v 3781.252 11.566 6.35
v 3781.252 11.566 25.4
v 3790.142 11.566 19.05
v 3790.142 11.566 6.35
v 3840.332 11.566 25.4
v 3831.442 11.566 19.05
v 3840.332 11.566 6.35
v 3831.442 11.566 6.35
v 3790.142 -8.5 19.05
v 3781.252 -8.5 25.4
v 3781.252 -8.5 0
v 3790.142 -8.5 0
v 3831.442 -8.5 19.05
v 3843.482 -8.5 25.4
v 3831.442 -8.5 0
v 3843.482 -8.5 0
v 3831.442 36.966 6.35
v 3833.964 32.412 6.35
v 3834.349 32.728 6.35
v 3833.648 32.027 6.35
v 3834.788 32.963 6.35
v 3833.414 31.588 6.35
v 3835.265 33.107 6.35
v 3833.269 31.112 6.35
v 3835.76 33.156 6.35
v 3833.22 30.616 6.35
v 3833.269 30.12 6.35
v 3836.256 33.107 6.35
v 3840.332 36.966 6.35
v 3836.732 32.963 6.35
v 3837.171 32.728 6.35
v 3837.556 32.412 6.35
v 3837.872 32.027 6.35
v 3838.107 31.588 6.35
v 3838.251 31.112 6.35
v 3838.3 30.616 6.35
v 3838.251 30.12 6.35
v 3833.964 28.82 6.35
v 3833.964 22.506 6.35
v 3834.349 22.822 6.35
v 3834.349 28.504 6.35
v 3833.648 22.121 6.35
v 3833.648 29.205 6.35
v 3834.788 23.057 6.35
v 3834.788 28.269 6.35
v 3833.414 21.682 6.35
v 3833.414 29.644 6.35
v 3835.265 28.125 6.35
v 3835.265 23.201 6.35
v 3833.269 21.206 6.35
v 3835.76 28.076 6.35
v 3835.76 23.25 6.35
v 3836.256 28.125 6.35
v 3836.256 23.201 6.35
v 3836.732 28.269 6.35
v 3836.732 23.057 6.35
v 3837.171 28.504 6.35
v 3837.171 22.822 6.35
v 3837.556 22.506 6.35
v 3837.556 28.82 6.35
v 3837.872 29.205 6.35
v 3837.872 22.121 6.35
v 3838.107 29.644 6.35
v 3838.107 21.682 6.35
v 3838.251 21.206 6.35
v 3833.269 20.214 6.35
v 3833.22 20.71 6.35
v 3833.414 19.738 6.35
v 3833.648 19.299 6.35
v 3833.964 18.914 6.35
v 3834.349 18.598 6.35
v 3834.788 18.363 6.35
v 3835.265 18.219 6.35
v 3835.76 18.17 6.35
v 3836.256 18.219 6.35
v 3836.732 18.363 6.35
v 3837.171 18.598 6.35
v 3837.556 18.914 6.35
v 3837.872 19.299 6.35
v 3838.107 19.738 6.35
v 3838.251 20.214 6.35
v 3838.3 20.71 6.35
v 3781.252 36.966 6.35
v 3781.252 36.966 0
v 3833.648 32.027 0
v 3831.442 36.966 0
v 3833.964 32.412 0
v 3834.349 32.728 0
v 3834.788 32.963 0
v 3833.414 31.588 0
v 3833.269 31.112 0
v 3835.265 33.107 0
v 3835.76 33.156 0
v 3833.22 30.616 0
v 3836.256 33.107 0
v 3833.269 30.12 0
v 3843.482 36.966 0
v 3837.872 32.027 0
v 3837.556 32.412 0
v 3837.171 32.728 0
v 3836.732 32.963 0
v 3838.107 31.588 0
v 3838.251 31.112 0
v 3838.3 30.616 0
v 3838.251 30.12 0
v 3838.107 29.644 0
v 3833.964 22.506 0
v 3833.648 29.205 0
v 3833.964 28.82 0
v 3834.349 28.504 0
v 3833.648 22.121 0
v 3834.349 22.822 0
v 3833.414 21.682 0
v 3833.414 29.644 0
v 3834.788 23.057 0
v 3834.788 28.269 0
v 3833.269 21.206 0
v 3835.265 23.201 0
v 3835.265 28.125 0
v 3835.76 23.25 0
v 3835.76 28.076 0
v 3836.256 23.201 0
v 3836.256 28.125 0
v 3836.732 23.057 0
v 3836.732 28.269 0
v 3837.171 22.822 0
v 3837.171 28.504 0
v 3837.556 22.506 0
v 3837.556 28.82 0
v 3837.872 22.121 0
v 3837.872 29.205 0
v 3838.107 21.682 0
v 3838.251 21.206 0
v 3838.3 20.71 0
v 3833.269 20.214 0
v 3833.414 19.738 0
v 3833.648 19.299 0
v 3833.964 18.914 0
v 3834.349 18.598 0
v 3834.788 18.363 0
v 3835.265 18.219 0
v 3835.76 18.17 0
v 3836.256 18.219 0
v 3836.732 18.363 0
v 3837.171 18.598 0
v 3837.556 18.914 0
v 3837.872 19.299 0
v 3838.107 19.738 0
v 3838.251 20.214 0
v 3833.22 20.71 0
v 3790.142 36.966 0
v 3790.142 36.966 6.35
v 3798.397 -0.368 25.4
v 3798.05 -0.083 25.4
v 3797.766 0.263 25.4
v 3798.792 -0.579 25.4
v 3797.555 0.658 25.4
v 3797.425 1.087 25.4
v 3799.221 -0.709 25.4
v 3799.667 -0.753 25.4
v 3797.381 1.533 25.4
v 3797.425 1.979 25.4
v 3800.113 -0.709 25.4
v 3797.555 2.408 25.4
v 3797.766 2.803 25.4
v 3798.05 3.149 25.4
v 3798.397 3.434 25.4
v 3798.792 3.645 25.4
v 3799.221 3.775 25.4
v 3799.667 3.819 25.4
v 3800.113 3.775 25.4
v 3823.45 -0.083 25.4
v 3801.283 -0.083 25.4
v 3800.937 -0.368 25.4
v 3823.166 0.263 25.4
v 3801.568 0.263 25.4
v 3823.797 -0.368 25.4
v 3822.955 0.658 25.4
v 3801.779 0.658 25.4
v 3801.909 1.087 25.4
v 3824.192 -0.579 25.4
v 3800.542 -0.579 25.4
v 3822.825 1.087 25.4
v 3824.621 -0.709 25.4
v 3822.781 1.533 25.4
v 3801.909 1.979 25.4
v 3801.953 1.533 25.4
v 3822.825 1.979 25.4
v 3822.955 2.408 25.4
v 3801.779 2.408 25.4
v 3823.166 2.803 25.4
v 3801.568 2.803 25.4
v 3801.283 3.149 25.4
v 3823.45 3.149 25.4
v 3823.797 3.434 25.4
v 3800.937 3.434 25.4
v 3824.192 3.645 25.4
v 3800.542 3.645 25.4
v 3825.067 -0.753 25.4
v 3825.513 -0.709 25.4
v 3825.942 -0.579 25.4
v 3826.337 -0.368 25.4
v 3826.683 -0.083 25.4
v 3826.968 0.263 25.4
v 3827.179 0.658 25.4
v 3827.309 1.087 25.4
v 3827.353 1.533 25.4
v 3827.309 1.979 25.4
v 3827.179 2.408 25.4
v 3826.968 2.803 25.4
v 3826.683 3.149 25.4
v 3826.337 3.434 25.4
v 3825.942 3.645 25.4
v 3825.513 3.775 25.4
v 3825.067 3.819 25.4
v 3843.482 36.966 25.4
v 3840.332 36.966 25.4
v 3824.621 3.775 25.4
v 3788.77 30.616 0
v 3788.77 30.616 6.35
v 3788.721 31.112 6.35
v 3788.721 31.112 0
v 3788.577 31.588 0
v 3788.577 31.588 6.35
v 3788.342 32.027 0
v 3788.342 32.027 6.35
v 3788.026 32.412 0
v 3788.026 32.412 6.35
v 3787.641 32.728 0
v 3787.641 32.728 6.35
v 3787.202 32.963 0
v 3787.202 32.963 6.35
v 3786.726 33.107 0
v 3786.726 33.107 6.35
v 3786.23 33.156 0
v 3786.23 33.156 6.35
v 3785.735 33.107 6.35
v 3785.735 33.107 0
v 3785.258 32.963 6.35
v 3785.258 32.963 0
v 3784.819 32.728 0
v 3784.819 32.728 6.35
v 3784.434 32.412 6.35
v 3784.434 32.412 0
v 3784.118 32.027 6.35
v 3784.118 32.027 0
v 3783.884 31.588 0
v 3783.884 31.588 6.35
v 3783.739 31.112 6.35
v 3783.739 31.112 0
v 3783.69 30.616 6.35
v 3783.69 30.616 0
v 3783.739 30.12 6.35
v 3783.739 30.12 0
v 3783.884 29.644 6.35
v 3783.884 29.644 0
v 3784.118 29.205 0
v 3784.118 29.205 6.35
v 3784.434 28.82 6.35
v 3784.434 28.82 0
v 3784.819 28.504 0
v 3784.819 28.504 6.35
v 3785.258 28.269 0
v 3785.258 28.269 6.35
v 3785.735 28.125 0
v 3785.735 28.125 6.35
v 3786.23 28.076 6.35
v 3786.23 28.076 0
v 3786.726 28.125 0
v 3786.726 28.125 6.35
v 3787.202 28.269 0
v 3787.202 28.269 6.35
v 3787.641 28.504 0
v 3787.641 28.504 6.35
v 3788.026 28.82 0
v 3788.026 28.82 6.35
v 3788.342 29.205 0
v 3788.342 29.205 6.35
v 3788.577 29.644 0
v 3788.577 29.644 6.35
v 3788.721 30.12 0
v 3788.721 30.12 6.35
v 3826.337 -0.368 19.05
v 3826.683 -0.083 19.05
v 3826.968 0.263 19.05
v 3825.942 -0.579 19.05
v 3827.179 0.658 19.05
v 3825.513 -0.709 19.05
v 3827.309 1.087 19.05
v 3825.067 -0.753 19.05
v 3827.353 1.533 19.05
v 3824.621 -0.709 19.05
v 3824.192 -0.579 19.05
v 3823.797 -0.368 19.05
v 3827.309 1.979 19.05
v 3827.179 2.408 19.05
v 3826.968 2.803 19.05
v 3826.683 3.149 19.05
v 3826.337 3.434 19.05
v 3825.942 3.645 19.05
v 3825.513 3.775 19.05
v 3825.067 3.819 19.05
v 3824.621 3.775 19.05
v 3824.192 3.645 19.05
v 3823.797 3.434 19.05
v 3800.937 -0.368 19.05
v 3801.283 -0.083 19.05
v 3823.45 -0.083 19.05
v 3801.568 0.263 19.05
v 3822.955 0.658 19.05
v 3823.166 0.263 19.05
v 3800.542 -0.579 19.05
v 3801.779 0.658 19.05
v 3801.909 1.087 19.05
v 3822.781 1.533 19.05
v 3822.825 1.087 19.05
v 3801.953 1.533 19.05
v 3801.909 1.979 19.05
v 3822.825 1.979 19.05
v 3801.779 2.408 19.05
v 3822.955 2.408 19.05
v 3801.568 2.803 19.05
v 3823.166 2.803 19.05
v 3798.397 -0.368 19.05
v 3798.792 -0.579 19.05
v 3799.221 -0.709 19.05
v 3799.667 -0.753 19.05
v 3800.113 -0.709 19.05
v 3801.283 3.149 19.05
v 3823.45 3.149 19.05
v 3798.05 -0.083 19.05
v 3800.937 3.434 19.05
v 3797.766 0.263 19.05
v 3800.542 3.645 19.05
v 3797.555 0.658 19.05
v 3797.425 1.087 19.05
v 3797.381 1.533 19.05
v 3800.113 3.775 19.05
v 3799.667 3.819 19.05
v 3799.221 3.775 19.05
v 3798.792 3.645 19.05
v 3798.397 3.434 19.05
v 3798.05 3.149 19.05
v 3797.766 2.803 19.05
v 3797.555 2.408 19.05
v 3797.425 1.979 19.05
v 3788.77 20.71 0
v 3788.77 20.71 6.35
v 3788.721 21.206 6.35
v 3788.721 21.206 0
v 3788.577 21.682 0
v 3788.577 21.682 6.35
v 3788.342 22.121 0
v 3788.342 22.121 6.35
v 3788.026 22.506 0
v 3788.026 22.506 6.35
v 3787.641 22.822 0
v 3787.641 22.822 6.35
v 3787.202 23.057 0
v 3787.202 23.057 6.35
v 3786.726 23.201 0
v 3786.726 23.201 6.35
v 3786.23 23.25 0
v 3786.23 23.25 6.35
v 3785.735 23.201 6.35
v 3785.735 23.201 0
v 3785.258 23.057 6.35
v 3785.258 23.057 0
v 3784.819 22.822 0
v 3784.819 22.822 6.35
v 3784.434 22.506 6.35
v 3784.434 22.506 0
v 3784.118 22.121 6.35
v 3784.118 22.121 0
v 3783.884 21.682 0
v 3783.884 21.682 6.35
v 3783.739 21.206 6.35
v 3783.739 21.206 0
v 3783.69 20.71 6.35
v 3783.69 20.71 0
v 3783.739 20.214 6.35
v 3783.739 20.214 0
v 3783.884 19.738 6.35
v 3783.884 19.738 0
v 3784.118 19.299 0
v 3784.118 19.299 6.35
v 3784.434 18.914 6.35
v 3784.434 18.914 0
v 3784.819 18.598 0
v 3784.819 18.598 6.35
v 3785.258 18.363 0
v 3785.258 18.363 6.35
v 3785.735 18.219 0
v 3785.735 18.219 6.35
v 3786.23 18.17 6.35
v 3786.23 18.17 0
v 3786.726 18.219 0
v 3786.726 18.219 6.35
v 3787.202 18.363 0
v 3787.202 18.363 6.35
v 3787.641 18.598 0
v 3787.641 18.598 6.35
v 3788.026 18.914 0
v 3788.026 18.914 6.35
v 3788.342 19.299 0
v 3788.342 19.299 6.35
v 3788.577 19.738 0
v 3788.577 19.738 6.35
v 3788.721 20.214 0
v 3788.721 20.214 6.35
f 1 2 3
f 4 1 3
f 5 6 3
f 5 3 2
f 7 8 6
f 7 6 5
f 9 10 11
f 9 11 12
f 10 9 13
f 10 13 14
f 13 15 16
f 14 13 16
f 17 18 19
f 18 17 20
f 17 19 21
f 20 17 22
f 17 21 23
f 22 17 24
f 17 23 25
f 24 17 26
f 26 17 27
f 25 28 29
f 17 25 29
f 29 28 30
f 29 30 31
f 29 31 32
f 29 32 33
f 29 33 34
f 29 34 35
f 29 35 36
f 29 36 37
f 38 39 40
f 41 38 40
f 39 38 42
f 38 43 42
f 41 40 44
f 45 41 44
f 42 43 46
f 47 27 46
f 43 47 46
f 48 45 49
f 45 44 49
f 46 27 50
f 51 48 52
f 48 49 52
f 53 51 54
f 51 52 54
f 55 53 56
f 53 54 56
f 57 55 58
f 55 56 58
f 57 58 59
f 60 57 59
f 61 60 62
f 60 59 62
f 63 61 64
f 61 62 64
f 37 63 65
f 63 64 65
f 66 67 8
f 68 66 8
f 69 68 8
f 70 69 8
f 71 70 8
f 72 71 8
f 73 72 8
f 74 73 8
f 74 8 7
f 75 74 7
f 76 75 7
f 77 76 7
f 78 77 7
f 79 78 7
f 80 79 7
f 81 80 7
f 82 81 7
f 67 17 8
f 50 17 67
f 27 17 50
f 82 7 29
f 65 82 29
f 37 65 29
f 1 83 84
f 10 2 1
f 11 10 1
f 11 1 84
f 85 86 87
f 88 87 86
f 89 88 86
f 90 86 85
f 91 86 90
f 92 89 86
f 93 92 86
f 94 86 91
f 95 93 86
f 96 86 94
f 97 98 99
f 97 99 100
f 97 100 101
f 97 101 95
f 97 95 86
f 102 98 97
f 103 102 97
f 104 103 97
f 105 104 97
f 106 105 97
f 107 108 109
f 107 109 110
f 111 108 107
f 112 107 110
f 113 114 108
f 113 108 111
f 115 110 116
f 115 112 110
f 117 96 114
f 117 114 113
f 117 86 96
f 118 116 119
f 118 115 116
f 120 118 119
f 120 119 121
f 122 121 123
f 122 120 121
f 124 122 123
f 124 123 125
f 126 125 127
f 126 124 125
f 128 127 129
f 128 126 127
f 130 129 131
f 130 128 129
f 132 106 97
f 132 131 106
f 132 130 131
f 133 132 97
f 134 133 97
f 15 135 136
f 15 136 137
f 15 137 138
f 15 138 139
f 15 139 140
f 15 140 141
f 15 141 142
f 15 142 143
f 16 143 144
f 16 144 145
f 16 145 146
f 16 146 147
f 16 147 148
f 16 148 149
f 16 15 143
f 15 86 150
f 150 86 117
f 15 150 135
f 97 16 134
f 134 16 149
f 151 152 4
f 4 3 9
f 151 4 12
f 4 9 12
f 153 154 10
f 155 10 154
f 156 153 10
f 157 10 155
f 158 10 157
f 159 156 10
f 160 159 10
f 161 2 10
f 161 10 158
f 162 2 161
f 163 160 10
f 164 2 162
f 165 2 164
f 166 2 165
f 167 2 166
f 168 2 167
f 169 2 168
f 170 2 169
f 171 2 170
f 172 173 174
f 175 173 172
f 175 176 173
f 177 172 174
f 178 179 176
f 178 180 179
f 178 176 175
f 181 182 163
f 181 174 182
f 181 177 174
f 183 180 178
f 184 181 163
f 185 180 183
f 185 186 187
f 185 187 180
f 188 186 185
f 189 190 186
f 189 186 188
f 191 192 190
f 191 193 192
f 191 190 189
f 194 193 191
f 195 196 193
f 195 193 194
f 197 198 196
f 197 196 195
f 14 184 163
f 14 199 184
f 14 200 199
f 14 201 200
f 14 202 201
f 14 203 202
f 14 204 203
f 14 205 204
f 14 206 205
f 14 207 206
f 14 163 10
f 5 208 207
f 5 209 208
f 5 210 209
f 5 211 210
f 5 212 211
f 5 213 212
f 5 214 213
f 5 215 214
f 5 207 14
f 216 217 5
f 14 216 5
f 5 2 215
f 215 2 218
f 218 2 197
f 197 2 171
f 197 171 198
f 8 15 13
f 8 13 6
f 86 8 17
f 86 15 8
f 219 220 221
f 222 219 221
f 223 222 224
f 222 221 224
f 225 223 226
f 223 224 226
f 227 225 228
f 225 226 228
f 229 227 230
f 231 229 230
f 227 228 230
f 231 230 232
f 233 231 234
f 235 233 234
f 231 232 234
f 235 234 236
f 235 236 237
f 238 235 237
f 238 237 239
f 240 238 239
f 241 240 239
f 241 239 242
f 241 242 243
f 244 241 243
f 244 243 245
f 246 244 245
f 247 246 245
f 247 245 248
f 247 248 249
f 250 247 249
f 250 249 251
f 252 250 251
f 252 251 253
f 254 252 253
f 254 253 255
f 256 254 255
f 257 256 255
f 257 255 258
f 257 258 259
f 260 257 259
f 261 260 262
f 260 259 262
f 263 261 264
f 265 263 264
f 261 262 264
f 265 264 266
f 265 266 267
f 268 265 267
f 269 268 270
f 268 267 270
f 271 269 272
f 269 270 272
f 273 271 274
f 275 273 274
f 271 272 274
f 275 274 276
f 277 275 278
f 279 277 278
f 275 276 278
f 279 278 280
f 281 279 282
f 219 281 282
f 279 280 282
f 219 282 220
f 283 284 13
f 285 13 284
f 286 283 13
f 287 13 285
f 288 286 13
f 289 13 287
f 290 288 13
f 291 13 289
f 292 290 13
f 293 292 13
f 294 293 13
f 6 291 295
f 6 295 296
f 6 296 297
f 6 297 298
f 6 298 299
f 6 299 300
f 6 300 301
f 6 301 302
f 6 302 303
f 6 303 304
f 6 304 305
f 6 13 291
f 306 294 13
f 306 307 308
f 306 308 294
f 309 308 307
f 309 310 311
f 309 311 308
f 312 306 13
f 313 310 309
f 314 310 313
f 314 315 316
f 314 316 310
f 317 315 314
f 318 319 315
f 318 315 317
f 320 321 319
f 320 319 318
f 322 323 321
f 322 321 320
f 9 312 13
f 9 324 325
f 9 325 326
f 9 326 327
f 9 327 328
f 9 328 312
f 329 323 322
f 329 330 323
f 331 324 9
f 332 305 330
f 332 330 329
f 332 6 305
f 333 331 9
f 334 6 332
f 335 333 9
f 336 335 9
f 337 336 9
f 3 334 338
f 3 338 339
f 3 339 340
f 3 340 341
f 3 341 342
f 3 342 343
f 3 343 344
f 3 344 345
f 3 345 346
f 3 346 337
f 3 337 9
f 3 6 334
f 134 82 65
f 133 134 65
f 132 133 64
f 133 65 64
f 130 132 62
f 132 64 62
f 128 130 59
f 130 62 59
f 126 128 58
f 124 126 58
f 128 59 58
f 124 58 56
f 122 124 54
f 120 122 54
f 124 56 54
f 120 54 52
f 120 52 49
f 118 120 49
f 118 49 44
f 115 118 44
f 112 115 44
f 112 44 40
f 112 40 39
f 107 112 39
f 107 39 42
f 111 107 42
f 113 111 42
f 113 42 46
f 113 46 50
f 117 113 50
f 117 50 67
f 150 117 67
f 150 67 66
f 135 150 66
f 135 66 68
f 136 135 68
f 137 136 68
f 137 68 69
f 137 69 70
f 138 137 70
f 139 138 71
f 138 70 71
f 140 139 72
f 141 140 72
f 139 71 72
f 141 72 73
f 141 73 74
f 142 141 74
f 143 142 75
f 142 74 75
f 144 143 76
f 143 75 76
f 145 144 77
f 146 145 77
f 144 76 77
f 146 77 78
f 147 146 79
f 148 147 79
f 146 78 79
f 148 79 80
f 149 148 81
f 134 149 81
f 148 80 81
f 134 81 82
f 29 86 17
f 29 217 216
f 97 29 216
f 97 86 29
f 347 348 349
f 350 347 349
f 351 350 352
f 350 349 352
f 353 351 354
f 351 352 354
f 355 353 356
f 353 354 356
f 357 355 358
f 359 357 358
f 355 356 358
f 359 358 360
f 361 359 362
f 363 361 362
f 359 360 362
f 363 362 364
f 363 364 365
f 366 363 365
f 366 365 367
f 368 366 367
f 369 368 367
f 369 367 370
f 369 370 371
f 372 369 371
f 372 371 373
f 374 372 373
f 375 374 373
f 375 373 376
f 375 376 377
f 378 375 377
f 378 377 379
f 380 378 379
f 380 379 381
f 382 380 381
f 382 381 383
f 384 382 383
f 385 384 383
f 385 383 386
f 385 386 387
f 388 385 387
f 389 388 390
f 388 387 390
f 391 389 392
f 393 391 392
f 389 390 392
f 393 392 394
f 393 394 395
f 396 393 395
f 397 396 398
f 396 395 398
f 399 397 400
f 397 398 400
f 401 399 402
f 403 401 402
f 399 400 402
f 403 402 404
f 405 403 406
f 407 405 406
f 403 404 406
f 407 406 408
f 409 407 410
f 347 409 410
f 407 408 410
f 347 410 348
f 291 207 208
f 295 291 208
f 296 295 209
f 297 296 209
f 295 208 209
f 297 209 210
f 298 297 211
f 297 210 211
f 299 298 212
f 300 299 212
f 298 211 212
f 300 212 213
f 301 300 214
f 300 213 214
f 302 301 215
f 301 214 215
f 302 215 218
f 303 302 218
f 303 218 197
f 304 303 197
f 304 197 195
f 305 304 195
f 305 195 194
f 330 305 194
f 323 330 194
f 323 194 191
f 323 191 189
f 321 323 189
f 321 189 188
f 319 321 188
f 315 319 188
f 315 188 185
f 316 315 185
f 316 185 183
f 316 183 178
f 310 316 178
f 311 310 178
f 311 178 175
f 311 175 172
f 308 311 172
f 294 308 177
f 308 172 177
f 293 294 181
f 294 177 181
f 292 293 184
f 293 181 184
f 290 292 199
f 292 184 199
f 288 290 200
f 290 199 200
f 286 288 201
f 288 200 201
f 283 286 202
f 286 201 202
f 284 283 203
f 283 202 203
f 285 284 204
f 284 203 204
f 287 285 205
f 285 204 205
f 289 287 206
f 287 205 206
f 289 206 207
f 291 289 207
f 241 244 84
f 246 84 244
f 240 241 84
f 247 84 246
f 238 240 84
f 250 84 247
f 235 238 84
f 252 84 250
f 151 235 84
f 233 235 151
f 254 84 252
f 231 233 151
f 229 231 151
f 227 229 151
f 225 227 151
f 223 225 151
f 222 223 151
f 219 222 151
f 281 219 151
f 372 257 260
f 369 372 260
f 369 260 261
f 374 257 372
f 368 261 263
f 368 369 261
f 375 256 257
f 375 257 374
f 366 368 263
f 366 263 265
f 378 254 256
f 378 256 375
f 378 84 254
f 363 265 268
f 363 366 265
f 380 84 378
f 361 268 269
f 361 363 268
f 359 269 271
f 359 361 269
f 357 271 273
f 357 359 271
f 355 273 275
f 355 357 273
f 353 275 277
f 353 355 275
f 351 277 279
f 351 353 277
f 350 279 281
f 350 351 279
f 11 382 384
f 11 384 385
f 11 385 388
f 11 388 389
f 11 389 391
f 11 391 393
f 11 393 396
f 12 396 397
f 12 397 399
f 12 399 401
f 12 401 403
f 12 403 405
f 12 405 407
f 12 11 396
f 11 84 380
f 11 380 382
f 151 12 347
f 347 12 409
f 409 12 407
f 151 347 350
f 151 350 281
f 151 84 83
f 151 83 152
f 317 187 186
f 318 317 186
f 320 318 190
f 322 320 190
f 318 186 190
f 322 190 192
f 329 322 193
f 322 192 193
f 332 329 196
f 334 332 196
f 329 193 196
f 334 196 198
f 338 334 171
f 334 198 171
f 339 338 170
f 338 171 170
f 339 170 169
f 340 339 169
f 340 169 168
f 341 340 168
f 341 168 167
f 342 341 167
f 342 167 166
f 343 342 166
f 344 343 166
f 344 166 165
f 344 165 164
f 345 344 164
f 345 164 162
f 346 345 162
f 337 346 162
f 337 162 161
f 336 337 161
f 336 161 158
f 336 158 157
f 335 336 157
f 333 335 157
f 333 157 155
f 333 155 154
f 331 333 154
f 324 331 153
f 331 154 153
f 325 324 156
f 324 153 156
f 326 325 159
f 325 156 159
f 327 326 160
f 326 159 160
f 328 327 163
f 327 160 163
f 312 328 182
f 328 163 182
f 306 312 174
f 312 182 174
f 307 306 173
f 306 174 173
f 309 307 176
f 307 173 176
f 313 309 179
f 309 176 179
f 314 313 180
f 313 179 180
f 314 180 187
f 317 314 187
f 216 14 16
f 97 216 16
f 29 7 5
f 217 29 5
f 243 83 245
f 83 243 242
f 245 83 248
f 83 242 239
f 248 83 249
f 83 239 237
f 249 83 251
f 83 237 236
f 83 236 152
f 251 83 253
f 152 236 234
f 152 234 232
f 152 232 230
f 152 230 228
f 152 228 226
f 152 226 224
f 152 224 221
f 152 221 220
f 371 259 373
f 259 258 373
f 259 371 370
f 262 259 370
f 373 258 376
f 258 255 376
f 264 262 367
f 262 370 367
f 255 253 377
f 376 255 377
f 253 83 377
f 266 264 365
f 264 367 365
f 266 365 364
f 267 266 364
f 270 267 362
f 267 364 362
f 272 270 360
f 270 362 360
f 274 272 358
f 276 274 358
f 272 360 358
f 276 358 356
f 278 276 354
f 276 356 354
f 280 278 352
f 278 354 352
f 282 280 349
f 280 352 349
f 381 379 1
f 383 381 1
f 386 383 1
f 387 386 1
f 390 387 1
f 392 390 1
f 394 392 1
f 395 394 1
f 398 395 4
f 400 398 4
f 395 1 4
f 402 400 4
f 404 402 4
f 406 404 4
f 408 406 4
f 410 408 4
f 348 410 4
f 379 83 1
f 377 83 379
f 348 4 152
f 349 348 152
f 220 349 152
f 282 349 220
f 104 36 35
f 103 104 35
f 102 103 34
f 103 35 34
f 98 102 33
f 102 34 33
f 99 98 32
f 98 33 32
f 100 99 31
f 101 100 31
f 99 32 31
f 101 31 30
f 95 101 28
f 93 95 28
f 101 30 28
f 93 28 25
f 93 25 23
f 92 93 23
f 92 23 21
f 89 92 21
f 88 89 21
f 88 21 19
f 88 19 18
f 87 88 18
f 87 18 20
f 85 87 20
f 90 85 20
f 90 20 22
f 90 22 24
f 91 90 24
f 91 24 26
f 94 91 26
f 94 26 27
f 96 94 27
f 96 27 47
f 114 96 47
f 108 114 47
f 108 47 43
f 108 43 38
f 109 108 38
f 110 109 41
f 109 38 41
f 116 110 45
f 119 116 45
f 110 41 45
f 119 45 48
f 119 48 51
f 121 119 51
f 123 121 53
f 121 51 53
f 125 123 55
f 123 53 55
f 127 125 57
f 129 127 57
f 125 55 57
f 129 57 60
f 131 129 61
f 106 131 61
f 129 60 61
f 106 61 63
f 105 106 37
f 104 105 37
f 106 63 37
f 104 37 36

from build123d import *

# Parameters (mm, degrees)
SKETCH1_W           = 62.23
SKETCH1_H           = 20.066
BOSS_EXTRUDE1_DEPTH = 25.4
BOSS_EXTRUDE2_DEPTH = 25.4
SKETCH4_W           = 8.89
SKETCH4_H           = 6.35
BOSS_EXTRUDE3_DEPTH = 25.4
SKETCH5_R           = 2.54
CUT_EXTRUDE1_DEPTH  = 7.35
SKETCH10_W          = 41.3004
SKETCH10_H          = 20.066
CUT_EXTRUDE6_DEPTH  = 19.05
SKETCH11_R          = 2.286
CUT_EXTRUDE7_DEPTH  = 26.4


with BuildPart() as part:
    # Sketch1 → Boss-Extrude1 (new body)
    with BuildSketch(Plane.XY):
        with Locations((3812.36685564, 1.533)):
            Rectangle(SKETCH1_W, SKETCH1_H)
    extrude(amount=BOSS_EXTRUDE1_DEPTH)

    # Sketch3 → Boss-Extrude2 (add)
    with BuildSketch(Plane(origin=(0, 11.566, 0), x_dir=(1, 0, 0), z_dir=(0, 1, 0))):
        Polygon((3831.44225564, 0), (3831.44225564, -6.35), (3840.33225564, -6.35), (3840.33225564, -25.4), (3843.48185564, -25.4), (3843.48185564, 0), align=None)
    extrude(amount=BOSS_EXTRUDE2_DEPTH)

    # Sketch4 → Boss-Extrude3 (add)
    with BuildSketch(Plane(origin=(0, 11.566, 0), x_dir=(1, 0, 0), z_dir=(0, 1, 0))):
        with Locations((3785.69685564, -3.175)):
            Rectangle(SKETCH4_W, SKETCH4_H)
    extrude(amount=BOSS_EXTRUDE3_DEPTH)

    # Sketch5 → Cut-Extrude1 (cut, through all)
    with BuildSketch(Plane.XY.offset(6.35)):
        with Locations((3835.76025564, 30.616)):
            Circle(SKETCH5_R)
        with Locations((3835.76025564, 20.71)):
            Circle(SKETCH5_R)
        with Locations((3786.23025564, 20.71)):
            Circle(SKETCH5_R)
        with Locations((3786.23025564, 30.616)):
            Circle(SKETCH5_R)
    extrude(amount=-CUT_EXTRUDE1_DEPTH, mode=Mode.SUBTRACT)

    # Sketch10 → Cut-Extrude6 (cut)
    with BuildSketch(Plane(origin=(0, 0, 0), x_dir=(-1, 0, 0), z_dir=(0, 0, -1))):
        with Locations((-3810.79205564, 1.533)):
            Rectangle(SKETCH10_W, SKETCH10_H)
    extrude(amount=-CUT_EXTRUDE6_DEPTH, mode=Mode.SUBTRACT)

    # Sketch11 → Cut-Extrude7 (cut, through all)
    with BuildSketch(Plane.XY.offset(25.4)):
        with Locations((3799.66685564, 1.533)):
            Circle(SKETCH11_R)
        with Locations((3825.06685564, 1.533)):
            Circle(SKETCH11_R)
    extrude(amount=-CUT_EXTRUDE7_DEPTH, mode=Mode.SUBTRACT)


solid = part.part
